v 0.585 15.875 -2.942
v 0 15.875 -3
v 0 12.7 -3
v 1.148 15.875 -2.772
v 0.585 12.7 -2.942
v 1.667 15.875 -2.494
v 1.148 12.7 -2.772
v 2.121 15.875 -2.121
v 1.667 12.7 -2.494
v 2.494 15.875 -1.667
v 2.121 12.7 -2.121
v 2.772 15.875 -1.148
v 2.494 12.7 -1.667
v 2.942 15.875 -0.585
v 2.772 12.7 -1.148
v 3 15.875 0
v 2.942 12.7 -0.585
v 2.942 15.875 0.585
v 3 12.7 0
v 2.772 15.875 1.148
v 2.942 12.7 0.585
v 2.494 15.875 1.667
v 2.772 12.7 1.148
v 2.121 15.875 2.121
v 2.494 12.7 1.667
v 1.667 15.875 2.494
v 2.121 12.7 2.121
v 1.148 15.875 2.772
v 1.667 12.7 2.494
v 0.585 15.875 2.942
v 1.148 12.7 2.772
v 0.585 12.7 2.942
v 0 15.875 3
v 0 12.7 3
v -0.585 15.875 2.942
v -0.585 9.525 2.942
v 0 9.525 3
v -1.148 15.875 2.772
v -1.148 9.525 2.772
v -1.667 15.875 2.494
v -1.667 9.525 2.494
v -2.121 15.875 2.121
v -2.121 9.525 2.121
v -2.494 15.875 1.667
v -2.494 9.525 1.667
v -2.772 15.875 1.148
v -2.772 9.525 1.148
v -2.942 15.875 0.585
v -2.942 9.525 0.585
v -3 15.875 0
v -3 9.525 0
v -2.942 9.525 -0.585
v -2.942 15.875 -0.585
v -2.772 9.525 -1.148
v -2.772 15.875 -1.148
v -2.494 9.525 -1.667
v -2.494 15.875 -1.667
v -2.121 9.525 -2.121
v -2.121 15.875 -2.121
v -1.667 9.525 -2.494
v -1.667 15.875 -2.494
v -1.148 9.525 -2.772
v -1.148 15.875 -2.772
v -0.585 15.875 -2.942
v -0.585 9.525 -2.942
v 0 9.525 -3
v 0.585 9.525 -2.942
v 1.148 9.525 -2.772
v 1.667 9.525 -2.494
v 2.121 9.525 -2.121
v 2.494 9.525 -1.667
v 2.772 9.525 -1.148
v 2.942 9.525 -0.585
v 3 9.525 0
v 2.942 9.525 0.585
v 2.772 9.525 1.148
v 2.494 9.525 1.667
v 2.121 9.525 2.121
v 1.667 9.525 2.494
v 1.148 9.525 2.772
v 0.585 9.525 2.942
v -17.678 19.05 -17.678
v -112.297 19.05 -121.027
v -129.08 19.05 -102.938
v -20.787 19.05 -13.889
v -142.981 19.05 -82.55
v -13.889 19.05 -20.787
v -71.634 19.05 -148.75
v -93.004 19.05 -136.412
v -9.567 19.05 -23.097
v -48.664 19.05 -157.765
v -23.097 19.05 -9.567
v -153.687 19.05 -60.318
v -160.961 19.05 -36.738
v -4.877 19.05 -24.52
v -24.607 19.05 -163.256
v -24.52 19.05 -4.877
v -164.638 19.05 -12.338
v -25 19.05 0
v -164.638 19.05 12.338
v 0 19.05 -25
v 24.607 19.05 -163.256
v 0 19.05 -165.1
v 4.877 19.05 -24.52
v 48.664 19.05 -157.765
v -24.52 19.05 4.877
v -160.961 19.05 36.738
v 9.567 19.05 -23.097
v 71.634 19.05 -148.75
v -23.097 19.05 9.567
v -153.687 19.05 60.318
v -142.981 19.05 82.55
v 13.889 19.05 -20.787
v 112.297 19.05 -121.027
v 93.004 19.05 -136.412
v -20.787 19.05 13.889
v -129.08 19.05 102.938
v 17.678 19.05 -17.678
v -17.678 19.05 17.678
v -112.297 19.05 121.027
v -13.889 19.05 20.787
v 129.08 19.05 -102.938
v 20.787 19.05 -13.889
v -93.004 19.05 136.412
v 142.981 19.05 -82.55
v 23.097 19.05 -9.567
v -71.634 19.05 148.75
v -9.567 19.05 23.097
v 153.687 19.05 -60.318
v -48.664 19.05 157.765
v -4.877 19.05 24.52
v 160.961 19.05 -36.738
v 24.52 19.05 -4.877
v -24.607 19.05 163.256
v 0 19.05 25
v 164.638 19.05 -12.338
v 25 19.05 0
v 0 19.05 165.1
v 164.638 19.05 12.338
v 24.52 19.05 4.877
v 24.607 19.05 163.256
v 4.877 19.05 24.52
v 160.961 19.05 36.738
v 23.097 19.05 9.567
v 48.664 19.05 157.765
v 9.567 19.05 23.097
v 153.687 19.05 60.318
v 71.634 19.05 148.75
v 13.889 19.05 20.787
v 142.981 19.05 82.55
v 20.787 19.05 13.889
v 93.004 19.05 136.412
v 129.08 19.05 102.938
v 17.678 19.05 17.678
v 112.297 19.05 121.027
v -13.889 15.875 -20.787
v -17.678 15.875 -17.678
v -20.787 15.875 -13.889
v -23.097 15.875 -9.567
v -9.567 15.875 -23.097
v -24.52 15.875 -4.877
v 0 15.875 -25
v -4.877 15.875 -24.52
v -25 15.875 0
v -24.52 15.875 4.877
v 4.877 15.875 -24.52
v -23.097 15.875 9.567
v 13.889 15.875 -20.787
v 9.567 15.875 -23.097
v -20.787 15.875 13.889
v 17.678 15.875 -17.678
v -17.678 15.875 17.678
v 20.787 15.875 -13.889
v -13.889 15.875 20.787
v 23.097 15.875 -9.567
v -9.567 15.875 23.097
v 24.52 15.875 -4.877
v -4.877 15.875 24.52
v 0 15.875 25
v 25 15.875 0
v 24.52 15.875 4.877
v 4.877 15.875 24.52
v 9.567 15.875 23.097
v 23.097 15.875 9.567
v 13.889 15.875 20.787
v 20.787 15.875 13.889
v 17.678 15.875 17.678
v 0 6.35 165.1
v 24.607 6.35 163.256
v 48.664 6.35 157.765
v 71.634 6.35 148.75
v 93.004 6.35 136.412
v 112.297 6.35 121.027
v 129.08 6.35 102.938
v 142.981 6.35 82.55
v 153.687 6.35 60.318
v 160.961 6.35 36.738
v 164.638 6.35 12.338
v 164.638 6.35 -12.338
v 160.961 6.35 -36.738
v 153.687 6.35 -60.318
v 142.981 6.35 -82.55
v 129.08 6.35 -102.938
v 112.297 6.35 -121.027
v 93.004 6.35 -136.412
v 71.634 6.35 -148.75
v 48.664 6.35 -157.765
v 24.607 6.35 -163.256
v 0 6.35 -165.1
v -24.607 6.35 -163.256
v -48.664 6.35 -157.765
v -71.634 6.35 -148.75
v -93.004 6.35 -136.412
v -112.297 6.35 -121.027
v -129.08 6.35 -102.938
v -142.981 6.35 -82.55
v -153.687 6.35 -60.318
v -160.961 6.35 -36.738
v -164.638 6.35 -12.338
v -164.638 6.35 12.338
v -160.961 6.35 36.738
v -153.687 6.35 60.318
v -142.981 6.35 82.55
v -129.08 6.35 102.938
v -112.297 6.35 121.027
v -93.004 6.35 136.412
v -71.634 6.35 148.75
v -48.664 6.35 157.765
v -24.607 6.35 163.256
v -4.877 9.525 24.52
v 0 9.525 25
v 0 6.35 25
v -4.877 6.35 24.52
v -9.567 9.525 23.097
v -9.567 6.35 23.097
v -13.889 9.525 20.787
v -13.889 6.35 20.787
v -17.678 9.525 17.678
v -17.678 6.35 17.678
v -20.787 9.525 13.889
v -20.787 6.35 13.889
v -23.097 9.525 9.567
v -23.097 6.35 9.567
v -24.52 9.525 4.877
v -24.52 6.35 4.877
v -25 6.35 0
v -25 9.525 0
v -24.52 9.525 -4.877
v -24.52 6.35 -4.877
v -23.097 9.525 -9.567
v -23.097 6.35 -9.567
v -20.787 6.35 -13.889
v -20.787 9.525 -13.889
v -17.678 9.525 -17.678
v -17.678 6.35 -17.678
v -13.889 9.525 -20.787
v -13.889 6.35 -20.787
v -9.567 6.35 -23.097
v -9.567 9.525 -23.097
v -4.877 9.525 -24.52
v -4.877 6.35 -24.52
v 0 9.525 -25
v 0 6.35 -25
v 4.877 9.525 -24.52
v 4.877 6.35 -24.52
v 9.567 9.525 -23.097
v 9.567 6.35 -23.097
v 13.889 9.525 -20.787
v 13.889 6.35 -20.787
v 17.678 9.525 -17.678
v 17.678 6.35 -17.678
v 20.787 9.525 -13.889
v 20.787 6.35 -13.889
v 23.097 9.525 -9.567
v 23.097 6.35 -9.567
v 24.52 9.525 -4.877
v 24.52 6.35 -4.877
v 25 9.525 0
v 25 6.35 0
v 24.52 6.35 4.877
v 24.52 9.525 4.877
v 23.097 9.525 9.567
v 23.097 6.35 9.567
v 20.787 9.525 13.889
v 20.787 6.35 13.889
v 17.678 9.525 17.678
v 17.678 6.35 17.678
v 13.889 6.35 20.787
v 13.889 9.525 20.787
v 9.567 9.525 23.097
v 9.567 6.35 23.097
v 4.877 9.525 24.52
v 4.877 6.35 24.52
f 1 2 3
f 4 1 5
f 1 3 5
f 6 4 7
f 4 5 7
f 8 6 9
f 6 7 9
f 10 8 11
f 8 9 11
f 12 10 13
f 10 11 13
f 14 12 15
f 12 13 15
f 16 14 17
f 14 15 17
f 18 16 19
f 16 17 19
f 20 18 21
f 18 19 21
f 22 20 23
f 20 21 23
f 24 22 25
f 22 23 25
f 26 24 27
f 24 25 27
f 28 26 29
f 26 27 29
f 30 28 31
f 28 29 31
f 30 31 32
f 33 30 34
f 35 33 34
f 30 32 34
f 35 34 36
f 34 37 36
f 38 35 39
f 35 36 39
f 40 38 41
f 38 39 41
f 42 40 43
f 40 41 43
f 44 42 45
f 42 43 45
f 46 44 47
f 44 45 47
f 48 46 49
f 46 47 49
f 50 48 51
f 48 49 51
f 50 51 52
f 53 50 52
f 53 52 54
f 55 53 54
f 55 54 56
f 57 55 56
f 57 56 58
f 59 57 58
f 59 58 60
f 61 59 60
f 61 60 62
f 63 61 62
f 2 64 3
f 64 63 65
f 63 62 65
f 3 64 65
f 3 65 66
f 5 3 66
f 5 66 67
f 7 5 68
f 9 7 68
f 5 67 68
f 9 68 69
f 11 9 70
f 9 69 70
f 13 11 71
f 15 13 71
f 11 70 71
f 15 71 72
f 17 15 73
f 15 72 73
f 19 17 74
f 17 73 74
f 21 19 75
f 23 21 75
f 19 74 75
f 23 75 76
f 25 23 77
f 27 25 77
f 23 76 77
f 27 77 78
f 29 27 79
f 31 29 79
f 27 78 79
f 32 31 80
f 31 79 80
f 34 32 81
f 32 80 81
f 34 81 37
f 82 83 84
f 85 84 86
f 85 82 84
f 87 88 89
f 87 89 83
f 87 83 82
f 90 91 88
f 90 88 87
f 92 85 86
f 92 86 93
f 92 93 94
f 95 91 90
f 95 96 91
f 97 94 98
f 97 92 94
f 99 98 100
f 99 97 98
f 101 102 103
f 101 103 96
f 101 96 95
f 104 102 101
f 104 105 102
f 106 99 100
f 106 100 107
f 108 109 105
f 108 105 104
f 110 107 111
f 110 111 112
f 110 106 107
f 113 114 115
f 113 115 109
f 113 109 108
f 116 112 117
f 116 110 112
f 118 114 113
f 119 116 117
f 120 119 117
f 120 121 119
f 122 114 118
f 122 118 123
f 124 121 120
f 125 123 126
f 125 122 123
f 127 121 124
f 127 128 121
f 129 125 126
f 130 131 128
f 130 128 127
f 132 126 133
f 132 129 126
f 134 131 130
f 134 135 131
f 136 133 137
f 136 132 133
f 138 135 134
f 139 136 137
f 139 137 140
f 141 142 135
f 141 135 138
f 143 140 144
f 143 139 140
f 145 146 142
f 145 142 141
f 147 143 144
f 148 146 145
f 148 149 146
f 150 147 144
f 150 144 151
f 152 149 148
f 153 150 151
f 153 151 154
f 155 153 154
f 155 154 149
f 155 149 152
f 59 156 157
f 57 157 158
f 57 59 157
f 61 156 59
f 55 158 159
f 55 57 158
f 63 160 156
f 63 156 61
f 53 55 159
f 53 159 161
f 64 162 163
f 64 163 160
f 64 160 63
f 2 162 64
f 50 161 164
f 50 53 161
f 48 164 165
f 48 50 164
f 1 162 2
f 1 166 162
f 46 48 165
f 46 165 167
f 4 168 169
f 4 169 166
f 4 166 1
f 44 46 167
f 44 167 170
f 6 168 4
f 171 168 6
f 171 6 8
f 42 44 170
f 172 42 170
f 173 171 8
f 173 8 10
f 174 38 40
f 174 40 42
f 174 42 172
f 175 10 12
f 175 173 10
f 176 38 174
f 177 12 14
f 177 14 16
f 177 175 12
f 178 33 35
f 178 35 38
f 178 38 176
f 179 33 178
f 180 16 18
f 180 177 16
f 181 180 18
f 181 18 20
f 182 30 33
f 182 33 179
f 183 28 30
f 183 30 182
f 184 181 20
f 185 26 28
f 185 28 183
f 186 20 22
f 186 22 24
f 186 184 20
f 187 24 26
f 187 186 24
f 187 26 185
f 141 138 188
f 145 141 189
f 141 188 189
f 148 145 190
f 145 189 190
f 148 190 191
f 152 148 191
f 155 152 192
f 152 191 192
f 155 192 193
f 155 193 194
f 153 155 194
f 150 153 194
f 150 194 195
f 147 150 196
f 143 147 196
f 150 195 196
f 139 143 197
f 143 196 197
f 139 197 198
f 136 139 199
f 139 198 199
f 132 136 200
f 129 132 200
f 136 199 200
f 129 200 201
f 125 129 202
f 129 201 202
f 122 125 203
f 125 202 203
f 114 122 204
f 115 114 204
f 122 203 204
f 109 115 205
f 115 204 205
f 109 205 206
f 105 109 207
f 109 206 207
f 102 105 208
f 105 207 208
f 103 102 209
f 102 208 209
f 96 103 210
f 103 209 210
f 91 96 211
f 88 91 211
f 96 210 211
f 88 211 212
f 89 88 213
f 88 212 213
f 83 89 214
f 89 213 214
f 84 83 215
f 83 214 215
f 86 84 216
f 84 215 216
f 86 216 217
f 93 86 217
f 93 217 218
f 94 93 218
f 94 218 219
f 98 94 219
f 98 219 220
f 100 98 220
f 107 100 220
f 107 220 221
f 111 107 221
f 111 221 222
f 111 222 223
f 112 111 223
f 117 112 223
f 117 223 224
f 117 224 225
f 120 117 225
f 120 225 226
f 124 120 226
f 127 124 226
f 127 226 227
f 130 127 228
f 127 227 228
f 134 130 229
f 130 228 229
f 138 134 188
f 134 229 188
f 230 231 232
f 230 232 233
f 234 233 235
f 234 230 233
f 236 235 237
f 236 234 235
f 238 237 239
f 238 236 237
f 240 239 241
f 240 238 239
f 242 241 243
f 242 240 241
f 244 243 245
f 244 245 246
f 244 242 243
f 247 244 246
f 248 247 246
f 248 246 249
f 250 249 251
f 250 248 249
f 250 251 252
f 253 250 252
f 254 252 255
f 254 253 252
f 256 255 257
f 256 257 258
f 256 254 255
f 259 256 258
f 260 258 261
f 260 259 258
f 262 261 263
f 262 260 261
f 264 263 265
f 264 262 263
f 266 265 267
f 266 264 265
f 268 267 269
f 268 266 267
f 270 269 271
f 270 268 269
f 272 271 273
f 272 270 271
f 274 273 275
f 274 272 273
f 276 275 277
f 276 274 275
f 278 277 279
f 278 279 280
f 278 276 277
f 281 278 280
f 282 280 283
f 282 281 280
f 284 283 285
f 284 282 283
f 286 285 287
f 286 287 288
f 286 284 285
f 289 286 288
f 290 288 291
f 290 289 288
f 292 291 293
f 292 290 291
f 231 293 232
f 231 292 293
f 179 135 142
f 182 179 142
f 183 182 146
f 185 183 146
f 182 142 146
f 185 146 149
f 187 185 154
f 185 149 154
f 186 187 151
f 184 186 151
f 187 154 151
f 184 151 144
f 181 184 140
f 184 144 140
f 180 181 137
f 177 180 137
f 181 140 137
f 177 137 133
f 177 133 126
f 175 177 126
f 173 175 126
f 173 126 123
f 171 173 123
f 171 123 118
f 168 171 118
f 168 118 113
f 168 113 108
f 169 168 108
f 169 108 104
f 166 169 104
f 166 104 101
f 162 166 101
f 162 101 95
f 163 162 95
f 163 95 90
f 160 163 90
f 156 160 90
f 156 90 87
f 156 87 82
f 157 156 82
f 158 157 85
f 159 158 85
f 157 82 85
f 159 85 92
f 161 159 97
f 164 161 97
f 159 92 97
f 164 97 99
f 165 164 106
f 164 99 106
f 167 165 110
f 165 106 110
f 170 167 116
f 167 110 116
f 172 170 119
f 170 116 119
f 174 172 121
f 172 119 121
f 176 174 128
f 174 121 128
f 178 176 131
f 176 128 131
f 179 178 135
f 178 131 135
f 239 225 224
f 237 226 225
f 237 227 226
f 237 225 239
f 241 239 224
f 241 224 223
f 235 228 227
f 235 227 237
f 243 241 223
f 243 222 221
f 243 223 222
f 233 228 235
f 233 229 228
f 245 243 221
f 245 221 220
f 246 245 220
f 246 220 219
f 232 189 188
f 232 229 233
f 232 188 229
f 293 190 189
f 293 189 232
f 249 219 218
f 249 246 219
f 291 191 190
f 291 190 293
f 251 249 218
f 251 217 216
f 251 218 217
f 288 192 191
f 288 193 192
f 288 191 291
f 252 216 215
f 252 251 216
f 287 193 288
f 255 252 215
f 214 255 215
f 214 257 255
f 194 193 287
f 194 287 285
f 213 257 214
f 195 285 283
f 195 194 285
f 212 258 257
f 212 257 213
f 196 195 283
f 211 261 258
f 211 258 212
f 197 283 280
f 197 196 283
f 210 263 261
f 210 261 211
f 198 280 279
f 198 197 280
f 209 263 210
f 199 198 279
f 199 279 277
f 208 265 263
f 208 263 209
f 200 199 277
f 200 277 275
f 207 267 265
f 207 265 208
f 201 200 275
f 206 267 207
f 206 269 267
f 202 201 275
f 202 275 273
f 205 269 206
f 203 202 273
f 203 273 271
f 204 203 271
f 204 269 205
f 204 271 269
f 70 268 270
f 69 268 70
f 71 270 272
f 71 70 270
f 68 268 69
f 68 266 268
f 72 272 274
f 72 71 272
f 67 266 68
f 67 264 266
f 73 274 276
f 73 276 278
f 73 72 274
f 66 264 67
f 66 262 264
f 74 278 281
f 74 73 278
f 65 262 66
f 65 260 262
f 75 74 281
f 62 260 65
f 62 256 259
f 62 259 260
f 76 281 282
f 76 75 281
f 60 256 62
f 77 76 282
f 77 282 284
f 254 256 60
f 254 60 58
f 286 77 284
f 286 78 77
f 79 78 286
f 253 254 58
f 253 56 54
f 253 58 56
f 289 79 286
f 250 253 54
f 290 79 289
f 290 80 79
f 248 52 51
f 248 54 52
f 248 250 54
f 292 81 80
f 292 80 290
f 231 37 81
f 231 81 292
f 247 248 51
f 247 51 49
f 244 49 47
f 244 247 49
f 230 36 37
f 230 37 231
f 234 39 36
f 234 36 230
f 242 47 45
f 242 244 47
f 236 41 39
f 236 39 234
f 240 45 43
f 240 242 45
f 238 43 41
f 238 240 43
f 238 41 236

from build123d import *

# Parameters (mm, degrees)
SKETCH1_R           = 165.1
SKETCH1_R_2         = 3
BOSS_EXTRUDE1_DEPTH = 12.7
SKETCH7_R           = 165.1
SKETCH7_R_2         = 3
BOSS_EXTRUDE3_DEPTH = 6.35
SKETCH8_R           = 25
CUT_EXTRUDE1_DEPTH  = 6.35
CUT_EXTRUDE2_START  = -6.35
SKETCH9_R           = 25
CUT_EXTRUDE2_DEPTH  = 6.35
SKETCH10_R          = 165.1
CUT_EXTRUDE3_DEPTH  = 6.35
CUT_EXTRUDE5_START  = -3.175
SKETCH11_R          = 25
CUT_EXTRUDE5_DEPTH  = 3.175
BOSS_EXTRUDE4_START = 3.175
SKETCH12_R          = 25
BOSS_EXTRUDE4_DEPTH = 3.175
SKETCH13_R          = 3
CUT_EXTRUDE6_DEPTH  = 3.175


with BuildPart() as part:
    # Sketch1 → Boss-Extrude1 (new body)
    with BuildSketch(Plane(origin=(0, 0, 0), x_dir=(1, 0, 0), z_dir=(0, 1, 0))):
        with Locations(Location((0, 0, 0), (0, 0, 270))):
            Circle(SKETCH1_R)
        with Locations(Location((0, 0, 0), (0, 0, 270))):
            Circle(SKETCH1_R_2, mode=Mode.SUBTRACT)
    extrude(amount=BOSS_EXTRUDE1_DEPTH)

    # Sketch7 → Boss-Extrude3 (add)
    with BuildSketch(Plane(origin=(0, 12.7, 0), x_dir=(1, 0, 0), z_dir=(0, 1, 0))):
        with Locations(Location((0, 0, 0), (0, 0, 270))):
            Circle(SKETCH7_R)
        with Locations(Location((0, 0, 0), (0, 0, 270))):
            Circle(SKETCH7_R_2, mode=Mode.SUBTRACT)
    extrude(amount=BOSS_EXTRUDE3_DEPTH)

    # Sketch8 → Cut-Extrude1 (cut)
    with BuildSketch(Plane(origin=(0, 19.05, 0), x_dir=(1, 0, 0), z_dir=(0, 1, 0))):
        with Locations(Location((0, 0, 0), (0, 0, 270))):
            Circle(SKETCH8_R)
    extrude(amount=-CUT_EXTRUDE1_DEPTH, mode=Mode.SUBTRACT)

    # Sketch9 → Cut-Extrude2 (cut)
    with BuildSketch(Plane.XZ.offset(CUT_EXTRUDE2_START)):
        with Locations(Location((0, 0, 0), (0, 0, 90))):
            Circle(SKETCH9_R)
    extrude(amount=CUT_EXTRUDE2_DEPTH, mode=Mode.SUBTRACT)

    # Sketch10 → Cut-Extrude3 (cut)
    with BuildSketch(Plane.XZ):
        with Locations(Location((0, 0, 0), (0, 0, 270))):
            Circle(SKETCH10_R)
    extrude(amount=-CUT_EXTRUDE3_DEPTH, mode=Mode.SUBTRACT)

    # Sketch11 → Cut-Extrude5 (cut)
    with BuildSketch(Plane.XZ.offset(-6.35).offset(CUT_EXTRUDE5_START)):
        with Locations(Location((0, 0, 0), (0, 0, 90))):
            Circle(SKETCH11_R)
    extrude(amount=CUT_EXTRUDE5_DEPTH, mode=Mode.SUBTRACT)

    # Sketch12 → Boss-Extrude4 (add)
    with BuildSketch(Plane(origin=(0, 12.7, 0), x_dir=(1, 0, 0), z_dir=(0, 1, 0)).offset(BOSS_EXTRUDE4_START)):
        with Locations(Location((0, 0, 0), (0, 0, 270))):
            Circle(SKETCH12_R)
    extrude(amount=-BOSS_EXTRUDE4_DEPTH)

    # Sketch13 → Cut-Extrude6 (cut)
    with BuildSketch(Plane.XZ.offset(-12.7)):
        with Locations(Location((0, 0, 0), (0, 0, 270))):
            Circle(SKETCH13_R)
    extrude(amount=-CUT_EXTRUDE6_DEPTH, mode=Mode.SUBTRACT)


solid = part.part
